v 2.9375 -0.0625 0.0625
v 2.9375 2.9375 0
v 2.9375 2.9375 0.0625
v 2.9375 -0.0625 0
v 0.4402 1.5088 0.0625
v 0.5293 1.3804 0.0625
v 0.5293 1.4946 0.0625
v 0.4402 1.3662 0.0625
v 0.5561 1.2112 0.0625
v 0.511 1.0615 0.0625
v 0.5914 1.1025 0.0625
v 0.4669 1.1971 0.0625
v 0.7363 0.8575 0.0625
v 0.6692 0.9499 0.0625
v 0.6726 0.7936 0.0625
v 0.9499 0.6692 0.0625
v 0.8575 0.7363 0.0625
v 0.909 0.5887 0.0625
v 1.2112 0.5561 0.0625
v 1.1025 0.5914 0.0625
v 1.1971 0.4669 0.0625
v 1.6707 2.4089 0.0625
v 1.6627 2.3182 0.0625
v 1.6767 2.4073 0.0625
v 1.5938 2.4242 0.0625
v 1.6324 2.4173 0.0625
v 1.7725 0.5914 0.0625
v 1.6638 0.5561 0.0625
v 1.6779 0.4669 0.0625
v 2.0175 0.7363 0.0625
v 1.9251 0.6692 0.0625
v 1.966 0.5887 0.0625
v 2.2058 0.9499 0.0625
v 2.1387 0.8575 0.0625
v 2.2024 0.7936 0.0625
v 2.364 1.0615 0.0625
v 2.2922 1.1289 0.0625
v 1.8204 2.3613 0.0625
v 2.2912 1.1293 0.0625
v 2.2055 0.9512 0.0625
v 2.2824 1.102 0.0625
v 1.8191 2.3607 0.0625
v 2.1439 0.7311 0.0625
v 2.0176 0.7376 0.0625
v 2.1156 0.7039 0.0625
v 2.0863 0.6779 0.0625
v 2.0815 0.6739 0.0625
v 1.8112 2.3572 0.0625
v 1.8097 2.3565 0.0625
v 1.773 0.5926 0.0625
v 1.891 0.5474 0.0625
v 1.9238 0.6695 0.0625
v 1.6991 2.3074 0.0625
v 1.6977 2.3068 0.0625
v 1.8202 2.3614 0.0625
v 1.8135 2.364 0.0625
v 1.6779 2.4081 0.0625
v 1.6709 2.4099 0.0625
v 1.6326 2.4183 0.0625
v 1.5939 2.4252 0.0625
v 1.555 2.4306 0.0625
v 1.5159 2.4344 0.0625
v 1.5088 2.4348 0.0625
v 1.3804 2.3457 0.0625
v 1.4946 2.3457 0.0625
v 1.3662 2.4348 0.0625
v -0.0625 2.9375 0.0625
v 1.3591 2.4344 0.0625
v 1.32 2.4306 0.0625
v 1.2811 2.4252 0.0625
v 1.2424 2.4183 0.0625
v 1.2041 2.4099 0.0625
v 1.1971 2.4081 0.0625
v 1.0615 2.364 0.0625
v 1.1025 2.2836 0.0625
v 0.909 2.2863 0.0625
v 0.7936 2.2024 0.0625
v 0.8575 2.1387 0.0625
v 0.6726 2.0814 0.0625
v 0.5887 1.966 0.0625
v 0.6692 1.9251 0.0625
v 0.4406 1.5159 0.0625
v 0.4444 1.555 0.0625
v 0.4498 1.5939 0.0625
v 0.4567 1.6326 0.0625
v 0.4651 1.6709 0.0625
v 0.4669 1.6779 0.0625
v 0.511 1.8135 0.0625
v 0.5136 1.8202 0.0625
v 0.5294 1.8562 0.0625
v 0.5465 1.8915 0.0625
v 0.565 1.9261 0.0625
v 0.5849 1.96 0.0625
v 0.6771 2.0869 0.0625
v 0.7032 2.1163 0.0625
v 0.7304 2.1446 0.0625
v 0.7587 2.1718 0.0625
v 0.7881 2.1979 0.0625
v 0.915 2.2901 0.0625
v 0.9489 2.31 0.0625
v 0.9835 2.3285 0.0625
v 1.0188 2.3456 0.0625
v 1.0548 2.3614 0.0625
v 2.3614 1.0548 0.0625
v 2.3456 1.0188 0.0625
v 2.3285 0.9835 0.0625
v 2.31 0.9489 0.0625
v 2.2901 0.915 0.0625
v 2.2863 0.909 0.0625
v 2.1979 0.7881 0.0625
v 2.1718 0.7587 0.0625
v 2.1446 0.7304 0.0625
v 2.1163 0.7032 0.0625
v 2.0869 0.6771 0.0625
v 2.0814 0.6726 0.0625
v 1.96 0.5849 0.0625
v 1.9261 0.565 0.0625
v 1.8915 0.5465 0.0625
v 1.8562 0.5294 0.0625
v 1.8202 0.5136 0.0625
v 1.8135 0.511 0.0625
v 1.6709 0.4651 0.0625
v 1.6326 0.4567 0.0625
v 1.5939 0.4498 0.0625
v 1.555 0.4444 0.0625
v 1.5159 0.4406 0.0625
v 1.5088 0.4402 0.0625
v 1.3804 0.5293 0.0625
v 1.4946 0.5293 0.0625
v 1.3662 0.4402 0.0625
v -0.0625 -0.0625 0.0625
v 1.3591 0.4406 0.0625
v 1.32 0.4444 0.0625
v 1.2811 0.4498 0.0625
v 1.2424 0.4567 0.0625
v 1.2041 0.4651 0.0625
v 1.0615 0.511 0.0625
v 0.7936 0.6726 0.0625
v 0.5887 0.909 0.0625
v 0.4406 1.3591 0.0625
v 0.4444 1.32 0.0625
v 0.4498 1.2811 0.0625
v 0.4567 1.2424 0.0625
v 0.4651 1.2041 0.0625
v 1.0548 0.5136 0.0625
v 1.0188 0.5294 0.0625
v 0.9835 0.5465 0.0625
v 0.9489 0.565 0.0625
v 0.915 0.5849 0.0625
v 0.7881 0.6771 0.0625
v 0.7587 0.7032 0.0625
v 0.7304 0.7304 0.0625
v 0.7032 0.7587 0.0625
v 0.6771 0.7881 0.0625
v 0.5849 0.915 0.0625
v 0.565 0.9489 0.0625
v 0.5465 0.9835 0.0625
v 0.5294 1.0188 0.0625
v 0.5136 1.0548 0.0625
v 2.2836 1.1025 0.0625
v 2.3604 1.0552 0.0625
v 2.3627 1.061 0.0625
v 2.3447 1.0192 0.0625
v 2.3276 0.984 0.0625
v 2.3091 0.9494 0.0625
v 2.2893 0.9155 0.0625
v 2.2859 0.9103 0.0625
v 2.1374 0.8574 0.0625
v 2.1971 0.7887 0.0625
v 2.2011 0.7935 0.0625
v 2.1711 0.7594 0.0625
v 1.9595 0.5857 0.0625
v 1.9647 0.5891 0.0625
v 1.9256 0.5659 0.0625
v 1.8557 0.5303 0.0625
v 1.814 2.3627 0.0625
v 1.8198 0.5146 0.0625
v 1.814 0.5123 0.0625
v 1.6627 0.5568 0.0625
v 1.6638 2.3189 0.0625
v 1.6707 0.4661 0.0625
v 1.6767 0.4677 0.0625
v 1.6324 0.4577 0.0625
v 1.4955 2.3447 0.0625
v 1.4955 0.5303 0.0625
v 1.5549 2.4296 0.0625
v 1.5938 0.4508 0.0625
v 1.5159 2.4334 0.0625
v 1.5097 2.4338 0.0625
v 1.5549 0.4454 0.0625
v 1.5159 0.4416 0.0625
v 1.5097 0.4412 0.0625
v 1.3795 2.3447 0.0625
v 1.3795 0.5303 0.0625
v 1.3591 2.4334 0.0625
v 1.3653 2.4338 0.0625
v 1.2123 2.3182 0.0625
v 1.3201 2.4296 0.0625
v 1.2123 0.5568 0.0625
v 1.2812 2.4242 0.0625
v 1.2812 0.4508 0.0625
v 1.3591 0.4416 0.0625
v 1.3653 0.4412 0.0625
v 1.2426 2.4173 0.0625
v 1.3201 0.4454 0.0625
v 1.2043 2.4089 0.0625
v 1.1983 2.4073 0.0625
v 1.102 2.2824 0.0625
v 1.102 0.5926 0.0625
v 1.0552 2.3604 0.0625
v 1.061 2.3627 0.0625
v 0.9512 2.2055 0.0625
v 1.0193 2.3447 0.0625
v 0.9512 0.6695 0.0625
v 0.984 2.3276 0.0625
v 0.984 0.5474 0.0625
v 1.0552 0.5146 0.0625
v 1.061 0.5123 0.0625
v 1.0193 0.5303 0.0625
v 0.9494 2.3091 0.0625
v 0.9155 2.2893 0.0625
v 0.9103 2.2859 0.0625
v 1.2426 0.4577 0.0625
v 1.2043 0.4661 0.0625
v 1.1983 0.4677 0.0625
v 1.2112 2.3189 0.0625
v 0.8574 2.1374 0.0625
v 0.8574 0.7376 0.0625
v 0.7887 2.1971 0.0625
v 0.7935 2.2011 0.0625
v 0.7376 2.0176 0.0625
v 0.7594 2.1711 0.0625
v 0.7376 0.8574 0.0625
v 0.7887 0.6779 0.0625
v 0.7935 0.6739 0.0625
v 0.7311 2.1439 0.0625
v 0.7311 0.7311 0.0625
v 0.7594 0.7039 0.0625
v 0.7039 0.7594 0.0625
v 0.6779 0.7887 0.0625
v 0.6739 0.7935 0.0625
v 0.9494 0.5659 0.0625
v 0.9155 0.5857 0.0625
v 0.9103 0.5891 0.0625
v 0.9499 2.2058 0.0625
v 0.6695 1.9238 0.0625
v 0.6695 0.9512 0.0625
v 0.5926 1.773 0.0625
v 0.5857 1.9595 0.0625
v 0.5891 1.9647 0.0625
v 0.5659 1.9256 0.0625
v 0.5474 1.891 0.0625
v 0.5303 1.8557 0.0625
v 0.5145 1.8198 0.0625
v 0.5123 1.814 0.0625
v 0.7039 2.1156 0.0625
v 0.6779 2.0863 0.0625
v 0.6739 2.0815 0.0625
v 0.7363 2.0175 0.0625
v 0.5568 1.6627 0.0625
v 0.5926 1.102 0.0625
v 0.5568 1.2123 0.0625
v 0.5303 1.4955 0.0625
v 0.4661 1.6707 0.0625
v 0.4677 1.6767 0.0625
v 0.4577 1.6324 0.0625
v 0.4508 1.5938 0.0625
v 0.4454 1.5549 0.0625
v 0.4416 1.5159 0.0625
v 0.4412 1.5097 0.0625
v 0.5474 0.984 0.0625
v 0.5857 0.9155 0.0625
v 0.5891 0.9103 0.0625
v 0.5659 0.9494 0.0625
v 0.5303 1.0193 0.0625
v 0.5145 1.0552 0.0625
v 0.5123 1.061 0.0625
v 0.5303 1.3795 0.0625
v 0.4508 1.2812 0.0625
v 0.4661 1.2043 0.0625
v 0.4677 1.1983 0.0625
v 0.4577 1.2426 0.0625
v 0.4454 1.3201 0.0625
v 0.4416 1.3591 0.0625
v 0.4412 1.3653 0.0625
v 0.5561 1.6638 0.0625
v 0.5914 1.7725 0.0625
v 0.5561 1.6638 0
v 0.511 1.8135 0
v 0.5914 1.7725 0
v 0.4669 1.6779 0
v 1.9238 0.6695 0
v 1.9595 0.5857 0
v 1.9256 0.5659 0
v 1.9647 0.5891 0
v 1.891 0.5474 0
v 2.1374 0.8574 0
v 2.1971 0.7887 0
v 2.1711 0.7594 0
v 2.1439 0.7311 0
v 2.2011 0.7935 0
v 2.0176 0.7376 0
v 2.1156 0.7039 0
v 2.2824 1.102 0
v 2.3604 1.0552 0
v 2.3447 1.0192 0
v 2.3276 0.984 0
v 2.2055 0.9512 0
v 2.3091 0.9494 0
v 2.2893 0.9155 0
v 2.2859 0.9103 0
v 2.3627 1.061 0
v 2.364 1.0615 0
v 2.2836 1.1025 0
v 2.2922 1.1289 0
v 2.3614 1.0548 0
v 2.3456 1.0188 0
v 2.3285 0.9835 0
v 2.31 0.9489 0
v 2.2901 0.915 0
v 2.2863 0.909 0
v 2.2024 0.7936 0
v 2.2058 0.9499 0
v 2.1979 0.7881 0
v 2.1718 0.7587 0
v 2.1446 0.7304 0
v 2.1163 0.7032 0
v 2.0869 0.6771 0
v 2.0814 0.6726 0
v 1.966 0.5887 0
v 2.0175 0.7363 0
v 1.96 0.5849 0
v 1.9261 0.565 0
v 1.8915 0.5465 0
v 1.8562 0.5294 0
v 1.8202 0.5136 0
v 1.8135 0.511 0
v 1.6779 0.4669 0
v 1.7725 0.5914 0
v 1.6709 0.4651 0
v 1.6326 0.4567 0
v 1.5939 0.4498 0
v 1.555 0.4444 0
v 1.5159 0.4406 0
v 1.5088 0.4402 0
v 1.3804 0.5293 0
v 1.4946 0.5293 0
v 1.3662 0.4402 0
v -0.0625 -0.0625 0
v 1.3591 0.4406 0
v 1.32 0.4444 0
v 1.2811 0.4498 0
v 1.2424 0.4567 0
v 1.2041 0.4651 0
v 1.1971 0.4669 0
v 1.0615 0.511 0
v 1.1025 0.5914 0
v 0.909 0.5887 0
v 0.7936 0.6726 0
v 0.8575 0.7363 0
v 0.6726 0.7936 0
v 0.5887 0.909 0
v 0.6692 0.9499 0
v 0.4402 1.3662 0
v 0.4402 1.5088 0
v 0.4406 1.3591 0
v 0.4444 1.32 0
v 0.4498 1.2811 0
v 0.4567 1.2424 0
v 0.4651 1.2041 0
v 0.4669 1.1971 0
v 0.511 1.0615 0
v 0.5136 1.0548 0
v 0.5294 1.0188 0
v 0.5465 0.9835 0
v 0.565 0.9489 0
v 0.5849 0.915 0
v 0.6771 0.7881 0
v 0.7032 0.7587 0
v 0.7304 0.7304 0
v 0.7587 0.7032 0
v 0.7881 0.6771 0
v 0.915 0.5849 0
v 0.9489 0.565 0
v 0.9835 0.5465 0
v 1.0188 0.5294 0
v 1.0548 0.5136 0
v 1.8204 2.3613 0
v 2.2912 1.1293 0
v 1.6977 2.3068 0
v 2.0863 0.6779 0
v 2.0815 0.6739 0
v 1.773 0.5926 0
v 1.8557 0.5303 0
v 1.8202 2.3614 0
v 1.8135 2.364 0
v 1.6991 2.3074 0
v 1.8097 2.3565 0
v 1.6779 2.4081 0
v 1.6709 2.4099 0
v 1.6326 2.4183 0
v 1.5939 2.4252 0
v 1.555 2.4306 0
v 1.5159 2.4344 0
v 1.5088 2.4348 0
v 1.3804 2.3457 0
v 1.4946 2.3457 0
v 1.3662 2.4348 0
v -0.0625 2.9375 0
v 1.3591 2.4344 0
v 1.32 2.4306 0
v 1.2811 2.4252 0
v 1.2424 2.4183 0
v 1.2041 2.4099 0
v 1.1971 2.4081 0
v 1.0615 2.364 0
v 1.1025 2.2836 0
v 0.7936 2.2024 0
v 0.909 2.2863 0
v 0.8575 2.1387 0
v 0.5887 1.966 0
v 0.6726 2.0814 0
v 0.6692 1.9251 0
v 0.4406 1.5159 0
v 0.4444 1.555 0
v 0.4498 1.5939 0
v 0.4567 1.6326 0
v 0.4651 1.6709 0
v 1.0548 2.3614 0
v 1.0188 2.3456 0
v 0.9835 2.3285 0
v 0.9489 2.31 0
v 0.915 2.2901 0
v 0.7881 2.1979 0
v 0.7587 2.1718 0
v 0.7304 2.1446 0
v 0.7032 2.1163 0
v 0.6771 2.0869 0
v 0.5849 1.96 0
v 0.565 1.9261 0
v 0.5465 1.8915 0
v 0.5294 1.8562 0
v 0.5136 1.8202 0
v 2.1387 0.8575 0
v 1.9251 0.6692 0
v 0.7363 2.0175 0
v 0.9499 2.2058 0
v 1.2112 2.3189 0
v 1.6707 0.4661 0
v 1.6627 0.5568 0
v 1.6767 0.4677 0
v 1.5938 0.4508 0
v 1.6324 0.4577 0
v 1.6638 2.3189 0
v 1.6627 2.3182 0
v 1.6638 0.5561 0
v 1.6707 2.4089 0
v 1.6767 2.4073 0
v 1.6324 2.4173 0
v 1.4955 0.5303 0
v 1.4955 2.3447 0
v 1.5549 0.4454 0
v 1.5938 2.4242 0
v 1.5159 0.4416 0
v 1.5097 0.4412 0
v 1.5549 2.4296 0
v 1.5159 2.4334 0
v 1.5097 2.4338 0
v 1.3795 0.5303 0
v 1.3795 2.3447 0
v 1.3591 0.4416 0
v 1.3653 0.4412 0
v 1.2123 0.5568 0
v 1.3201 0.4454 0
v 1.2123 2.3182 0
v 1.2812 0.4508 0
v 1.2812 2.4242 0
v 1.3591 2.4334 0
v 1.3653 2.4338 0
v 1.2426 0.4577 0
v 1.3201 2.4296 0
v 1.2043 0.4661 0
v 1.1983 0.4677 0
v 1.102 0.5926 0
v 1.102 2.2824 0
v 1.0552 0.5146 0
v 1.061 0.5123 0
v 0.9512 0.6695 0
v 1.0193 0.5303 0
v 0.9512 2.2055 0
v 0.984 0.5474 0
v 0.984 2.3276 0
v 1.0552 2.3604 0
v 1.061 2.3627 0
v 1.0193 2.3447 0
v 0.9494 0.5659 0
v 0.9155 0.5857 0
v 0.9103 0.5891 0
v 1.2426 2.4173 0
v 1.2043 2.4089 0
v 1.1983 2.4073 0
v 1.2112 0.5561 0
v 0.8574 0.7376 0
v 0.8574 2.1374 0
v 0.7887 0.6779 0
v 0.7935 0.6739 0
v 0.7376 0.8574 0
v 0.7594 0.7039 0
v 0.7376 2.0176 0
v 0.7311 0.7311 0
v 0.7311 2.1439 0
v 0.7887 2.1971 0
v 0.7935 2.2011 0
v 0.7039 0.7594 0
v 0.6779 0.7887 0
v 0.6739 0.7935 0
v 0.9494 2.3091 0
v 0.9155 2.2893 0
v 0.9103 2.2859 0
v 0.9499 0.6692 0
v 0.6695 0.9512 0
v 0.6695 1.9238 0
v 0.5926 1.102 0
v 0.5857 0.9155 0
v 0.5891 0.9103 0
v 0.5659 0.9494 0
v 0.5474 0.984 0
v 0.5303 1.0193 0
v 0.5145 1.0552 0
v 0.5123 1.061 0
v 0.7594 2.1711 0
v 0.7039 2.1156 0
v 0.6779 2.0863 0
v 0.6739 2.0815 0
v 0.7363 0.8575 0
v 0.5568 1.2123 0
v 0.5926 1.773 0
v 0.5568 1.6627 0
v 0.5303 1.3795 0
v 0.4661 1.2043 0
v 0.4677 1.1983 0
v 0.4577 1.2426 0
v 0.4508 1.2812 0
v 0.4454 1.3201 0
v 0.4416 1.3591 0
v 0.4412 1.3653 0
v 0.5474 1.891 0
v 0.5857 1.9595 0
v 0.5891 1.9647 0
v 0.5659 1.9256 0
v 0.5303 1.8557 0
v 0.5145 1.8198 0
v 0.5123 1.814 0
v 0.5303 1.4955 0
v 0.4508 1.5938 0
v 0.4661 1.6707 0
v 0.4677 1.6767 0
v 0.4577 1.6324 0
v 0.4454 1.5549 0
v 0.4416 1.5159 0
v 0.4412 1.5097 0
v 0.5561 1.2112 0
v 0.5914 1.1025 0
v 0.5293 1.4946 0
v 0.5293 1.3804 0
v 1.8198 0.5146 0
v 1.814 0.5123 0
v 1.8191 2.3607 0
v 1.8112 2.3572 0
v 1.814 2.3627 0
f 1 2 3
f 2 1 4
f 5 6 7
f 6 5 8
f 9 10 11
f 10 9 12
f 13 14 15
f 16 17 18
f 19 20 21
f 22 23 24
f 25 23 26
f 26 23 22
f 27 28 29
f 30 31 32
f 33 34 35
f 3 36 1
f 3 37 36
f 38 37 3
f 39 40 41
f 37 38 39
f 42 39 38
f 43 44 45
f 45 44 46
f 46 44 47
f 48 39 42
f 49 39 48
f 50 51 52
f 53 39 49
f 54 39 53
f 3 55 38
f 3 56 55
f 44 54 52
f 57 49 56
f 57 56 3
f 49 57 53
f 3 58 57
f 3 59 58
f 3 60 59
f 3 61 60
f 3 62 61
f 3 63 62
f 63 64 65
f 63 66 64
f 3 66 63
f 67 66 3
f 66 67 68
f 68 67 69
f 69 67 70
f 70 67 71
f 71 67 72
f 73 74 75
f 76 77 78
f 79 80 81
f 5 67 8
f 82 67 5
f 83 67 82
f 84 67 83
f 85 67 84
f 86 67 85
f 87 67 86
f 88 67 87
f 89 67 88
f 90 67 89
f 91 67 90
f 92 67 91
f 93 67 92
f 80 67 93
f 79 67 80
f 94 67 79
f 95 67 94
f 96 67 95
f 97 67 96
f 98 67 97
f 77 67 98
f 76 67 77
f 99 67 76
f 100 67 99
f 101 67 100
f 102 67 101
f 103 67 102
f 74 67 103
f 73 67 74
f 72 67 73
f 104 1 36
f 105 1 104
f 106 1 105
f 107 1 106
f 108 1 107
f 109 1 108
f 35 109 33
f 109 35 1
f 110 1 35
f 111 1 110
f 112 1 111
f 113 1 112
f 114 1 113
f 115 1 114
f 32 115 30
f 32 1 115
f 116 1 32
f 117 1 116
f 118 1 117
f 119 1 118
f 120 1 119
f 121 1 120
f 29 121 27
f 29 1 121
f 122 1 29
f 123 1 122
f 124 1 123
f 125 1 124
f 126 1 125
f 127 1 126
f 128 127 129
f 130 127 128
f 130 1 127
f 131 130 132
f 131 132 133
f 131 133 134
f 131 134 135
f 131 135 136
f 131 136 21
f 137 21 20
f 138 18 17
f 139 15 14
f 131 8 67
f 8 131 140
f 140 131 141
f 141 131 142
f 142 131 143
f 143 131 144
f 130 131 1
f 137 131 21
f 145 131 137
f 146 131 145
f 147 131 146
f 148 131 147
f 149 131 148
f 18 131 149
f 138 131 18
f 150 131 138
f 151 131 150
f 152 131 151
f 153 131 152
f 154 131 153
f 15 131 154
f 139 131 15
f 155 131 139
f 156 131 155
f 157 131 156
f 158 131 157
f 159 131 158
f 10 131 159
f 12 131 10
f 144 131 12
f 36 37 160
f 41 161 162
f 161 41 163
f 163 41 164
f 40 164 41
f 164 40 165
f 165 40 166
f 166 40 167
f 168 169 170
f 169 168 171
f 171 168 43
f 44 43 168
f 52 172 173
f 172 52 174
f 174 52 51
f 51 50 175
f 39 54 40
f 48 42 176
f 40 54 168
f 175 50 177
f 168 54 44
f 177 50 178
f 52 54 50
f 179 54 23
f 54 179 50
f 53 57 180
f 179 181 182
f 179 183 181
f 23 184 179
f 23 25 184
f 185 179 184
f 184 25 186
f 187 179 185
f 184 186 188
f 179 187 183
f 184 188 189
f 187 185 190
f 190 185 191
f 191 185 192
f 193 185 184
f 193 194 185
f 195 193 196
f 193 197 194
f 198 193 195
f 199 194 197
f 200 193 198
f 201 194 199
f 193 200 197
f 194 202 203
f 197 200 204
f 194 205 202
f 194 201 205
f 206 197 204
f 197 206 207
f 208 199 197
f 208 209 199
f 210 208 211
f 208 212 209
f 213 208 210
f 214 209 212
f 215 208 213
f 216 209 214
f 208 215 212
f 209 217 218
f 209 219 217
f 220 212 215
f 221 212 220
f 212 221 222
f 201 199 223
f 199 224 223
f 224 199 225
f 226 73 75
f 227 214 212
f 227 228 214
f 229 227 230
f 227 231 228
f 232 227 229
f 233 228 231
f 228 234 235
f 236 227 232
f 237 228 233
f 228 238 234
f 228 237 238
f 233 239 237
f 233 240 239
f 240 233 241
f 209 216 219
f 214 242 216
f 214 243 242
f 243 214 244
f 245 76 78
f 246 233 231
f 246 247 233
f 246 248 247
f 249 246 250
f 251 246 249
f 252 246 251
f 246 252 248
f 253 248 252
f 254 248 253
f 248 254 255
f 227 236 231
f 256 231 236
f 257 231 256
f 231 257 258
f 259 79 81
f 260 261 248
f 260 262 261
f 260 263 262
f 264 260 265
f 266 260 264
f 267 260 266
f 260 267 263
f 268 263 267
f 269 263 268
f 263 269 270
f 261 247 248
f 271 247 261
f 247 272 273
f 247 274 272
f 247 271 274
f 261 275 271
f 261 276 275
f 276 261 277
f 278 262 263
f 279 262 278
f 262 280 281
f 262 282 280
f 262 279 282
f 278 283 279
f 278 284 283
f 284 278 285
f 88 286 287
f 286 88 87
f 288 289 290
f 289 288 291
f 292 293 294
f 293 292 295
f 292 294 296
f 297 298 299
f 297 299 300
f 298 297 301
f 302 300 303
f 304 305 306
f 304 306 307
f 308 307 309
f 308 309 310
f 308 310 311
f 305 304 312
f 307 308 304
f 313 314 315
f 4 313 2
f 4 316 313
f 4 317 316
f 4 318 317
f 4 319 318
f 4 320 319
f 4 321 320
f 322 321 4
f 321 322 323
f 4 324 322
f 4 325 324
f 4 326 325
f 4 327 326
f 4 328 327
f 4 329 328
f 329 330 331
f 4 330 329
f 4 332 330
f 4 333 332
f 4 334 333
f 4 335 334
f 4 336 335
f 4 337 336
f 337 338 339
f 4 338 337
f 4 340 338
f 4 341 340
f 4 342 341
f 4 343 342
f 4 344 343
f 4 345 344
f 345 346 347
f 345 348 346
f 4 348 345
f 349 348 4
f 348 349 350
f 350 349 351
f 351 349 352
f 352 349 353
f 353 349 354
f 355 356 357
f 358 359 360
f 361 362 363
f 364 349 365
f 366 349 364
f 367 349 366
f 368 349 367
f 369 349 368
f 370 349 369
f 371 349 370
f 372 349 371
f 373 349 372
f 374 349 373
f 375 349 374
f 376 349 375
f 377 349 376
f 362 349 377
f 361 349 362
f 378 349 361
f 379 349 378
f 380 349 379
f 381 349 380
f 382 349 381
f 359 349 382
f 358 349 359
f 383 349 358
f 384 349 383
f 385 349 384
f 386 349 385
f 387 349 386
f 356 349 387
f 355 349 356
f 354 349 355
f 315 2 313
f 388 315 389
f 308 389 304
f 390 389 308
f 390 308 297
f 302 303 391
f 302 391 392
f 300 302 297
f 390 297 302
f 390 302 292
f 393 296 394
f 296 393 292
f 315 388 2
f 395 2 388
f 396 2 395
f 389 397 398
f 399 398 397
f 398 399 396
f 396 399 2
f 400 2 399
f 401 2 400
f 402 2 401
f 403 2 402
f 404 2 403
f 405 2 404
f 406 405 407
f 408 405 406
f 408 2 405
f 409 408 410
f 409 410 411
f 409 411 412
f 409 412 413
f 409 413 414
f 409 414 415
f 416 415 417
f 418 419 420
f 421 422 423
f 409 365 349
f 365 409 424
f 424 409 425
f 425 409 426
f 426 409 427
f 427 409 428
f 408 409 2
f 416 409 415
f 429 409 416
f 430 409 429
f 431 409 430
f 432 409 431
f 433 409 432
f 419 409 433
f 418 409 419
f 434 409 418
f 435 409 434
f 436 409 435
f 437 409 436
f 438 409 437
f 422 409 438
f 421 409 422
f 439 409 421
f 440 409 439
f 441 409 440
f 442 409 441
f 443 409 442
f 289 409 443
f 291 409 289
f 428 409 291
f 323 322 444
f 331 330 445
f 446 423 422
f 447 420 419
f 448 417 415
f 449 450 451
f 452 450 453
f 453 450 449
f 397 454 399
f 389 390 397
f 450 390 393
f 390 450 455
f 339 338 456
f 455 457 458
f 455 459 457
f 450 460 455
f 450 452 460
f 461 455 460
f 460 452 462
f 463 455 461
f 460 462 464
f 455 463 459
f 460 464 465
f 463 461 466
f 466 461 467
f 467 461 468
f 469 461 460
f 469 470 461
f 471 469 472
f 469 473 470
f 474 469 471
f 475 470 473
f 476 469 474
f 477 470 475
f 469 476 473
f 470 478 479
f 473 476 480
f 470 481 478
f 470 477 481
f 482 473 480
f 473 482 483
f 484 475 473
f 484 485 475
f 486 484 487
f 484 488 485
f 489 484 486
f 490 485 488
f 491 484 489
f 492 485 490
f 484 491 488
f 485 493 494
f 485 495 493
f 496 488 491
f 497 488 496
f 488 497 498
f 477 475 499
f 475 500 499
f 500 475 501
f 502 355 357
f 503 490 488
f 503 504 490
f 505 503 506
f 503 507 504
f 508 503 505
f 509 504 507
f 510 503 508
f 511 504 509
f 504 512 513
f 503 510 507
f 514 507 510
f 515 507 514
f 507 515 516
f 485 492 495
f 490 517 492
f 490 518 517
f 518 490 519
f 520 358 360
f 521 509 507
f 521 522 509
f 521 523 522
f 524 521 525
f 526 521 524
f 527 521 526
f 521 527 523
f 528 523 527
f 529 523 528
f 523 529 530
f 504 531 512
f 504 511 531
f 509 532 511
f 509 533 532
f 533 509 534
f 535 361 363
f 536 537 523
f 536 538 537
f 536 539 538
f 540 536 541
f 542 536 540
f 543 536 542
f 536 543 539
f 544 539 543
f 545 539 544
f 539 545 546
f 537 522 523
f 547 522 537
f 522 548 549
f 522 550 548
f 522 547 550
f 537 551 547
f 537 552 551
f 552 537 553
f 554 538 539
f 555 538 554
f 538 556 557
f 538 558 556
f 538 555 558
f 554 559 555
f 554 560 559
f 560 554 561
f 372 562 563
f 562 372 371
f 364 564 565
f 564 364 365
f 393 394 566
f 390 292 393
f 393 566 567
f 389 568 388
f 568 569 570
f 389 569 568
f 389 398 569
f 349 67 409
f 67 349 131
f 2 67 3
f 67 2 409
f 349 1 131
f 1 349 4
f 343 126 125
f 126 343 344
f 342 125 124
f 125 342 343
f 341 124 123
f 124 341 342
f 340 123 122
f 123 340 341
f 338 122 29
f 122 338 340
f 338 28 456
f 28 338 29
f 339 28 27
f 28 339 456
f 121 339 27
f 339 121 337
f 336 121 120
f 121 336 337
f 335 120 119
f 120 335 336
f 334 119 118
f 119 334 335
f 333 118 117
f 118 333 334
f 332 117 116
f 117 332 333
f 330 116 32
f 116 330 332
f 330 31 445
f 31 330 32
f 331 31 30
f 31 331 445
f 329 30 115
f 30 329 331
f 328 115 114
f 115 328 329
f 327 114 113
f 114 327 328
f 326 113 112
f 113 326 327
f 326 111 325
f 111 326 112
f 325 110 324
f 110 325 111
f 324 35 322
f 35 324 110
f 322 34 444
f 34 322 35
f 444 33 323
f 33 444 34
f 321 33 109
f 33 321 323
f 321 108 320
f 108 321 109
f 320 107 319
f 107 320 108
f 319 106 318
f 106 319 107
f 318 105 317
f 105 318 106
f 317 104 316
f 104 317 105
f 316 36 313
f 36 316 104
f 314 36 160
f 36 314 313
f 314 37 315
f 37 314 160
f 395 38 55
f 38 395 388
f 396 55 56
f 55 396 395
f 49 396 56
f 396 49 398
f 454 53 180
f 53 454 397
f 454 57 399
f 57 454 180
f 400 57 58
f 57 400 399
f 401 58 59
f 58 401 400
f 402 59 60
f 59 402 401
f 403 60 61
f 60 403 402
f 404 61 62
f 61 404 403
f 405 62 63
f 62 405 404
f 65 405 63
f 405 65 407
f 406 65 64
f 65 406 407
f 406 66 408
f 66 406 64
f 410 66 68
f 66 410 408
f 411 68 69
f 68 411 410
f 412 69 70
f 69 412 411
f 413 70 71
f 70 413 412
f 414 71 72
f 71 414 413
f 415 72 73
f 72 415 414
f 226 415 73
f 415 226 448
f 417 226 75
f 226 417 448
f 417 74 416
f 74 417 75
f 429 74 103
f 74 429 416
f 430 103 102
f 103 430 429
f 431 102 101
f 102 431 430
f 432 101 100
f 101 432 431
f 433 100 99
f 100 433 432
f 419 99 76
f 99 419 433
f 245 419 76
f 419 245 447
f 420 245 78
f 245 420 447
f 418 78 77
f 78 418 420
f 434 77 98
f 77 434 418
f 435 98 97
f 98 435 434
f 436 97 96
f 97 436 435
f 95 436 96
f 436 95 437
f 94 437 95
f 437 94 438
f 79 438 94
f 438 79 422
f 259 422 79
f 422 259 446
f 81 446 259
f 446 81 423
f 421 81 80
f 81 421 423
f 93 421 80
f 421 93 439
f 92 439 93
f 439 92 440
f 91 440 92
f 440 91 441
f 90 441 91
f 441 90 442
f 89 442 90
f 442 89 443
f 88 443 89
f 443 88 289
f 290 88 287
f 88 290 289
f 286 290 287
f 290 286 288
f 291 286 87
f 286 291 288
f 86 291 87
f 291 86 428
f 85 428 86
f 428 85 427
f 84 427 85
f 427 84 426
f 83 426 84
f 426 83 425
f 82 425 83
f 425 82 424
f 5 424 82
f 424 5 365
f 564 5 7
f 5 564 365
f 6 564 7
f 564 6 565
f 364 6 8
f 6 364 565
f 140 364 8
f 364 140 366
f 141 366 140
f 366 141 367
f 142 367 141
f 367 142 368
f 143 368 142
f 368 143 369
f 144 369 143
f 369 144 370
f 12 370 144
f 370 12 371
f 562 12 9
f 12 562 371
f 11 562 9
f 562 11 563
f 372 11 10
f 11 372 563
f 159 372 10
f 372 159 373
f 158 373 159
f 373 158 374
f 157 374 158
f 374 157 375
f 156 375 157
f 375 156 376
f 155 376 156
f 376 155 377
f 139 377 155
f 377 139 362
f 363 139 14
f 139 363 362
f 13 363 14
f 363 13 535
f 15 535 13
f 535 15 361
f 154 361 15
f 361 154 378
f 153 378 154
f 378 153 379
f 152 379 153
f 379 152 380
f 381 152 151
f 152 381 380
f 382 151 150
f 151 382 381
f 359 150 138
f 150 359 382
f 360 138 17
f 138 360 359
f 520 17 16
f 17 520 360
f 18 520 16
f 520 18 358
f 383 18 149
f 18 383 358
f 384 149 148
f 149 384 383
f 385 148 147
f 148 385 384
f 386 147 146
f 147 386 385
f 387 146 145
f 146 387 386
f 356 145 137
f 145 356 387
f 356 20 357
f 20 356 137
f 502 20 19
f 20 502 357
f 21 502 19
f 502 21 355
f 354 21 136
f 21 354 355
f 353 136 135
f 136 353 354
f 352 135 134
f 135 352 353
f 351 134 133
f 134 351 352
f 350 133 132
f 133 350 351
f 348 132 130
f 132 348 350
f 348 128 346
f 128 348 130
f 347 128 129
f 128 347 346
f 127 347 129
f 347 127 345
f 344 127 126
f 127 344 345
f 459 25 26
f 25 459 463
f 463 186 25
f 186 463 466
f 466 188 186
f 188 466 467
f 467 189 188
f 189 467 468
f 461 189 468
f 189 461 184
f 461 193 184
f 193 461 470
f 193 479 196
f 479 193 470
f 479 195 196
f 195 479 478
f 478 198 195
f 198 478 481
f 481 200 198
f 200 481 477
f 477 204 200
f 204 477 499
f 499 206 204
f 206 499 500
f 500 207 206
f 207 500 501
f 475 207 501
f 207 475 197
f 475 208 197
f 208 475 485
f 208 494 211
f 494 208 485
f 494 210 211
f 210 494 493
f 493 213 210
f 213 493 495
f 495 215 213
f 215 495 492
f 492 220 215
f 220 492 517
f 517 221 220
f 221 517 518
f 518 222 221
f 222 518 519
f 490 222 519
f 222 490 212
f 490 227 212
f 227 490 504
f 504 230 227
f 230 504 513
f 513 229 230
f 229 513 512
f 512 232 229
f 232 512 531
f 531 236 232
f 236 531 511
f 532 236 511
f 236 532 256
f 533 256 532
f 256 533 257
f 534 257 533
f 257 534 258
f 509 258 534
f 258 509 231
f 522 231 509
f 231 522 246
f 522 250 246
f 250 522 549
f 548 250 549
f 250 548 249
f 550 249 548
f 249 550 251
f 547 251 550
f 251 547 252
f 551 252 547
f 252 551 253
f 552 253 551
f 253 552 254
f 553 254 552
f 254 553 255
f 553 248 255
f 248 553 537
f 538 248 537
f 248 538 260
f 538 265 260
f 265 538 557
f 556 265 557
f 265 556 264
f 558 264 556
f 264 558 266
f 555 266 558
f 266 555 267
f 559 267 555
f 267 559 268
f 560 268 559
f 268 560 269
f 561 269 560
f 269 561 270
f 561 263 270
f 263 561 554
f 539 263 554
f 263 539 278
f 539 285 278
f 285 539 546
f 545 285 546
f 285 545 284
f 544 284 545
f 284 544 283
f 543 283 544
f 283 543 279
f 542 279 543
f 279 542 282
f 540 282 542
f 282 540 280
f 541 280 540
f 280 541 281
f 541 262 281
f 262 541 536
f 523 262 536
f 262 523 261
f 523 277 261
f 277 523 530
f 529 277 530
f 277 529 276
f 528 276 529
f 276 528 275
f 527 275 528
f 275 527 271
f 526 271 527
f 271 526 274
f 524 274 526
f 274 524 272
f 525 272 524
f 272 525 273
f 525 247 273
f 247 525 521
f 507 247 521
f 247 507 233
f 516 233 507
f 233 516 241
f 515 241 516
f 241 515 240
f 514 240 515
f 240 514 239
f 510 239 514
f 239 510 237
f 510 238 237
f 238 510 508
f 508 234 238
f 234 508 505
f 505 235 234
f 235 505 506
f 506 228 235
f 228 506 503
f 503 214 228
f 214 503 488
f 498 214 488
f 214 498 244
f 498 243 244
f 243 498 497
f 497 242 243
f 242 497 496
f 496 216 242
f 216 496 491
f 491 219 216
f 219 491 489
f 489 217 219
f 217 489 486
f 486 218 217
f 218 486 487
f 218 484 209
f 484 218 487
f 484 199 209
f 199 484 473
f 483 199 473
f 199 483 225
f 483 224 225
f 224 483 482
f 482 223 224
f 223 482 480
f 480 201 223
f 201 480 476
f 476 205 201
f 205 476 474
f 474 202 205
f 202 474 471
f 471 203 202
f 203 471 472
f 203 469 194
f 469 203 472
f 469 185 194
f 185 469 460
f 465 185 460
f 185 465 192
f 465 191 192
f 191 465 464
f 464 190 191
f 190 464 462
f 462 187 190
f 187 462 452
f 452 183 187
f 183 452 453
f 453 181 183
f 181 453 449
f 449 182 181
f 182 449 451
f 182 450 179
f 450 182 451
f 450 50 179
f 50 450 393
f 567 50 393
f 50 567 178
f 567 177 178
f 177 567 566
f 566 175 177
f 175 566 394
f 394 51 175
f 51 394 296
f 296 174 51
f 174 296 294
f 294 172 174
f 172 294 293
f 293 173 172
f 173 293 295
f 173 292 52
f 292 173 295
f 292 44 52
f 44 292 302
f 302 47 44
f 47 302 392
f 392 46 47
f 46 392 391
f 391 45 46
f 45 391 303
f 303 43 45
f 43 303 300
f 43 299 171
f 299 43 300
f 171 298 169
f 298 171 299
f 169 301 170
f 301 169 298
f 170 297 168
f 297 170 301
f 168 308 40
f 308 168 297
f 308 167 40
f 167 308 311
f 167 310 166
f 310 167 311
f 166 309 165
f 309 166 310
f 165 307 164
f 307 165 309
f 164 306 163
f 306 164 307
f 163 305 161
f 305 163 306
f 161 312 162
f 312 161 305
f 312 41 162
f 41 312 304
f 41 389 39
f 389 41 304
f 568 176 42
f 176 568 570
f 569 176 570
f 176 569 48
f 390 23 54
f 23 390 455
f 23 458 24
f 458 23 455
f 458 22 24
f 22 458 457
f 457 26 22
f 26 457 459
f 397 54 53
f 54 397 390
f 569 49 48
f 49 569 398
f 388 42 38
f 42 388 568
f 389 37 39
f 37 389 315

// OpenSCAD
// file: sub_innergears.scad
// sub_innergears.scad — shared inner gear ring (ring with inward-pointing teeth)
// Requires caller to define: plate_w, plate_d, plate_h (see sub_base_plate.scad)
// Units: inches
//
// Usage — must be `include`, positioned after sub_base_plate.scad and before any
// code that references gear_r_tip/gear_r_root/gear_r_bore:
//   include <sub_base_plate.scad>
//   include <sub_innergears.scad>
//   gear("darkred");
//   gear_bore("lightgray");
//
// gear(c) and gear_bore(c) take a color string so tiles with different gear
// colors (e.g. darkred vs darkgreen) can share this same file.

gear_r_tip  = 1.18;   // outer edge of ring (plain)
gear_r_root = 1.00;   // ring inner edge; teeth root here
gear_r_bore = 0.82;   // bore radius / tooth tip depth
gear_n      = 20;
tooth_hw    = 4.5;
tooth_tip_f = 0.80;

// ── Gear 2D helpers ───────────────────────────────────────────────────────────

module gear_tooth_2d() {
    shift   = (gear_r_root - gear_r_bore) / 2;
    r_outer = gear_r_root + shift;
    r_inner = gear_r_bore + shift;
    polygon([
        [r_outer * cos(-tooth_hw),               r_outer * sin(-tooth_hw)],
        [r_inner * cos(-tooth_hw * tooth_tip_f),  r_inner * sin(-tooth_hw * tooth_tip_f)],
        [r_inner * cos( tooth_hw * tooth_tip_f),  r_inner * sin( tooth_hw * tooth_tip_f)],
        [r_outer * cos( tooth_hw),               r_outer * sin( tooth_hw)],
    ]);
}

module gear_2d() {
    circle(r = gear_r_tip, $fn = 160);
}

module bore_2d() {
    pitch = 360 / gear_n;
    difference() {
        circle(r = gear_r_root, $fn = 160);
        for (i = [0:gear_n - 1]) rotate([0, 0, i * pitch]) gear_tooth_2d();
    }
}

// ── Gear holes & gear ────────────────────────────────────────────────────────

module gear_holes() {
    translate([plate_w / 2, plate_d / 2, -1])
    linear_extrude(plate_h + 2)
    difference() {
        gear_2d();
        bore_2d();
    }
}

module gear(c) {
    color(c)
    translate([plate_w / 2, plate_d / 2, 0])
    linear_extrude(plate_h)
    difference() { gear_2d(); bore_2d(); }
}

// ── Gear bore hole & gear bore ────────────────────────────────────────────────

module gear_bore_holes() {
    translate([plate_w / 2, plate_d / 2, -1])
    linear_extrude(plate_h + 2)
    bore_2d();
}

module gear_bore(c) {
    color(c)
    translate([plate_w / 2, plate_d / 2, 0])
    linear_extrude(plate_h)
    offset(delta = -0.001) bore_2d();
}
// file: sub_base_plate.scad
// sub_base_plate.scad — shared tile-building blocks: plate, rivets, edge ID marks,
// and the common plate/hole dimensional constants used by every tile.
// Units: inches
//
// Usage — must be `include`, not `use`, and the include line must come
// before any code in the caller that references plate_w/plate_d/plate_h/
// frame_w/hole_d/hole_r: a variable defined only inside an included file is
// invisible to code positioned before the include statement.
//   include <sub_base_plate.scad>
//   plate(["red", undef, "blue", undef, undef, "green"]);
//
// plate(colors) is the main entry point: it builds the complete base tile in
// one call — the frame with edge ID marks, the darkgray plate, and the
// lightgray rivet ring (40 rivets, 10 per side, corners shared). colors is the
// same 6-slot frame_with_id() array described below.
//
// frame_with_id() colors are applied left-to-right (−x to +x), repeated
// identically on all four edges. Bottom and right edges read the array in
// reverse (slot 5-i) so the pattern stays consistent when the tile is flipped.
// Any position left as undef or omitted defaults to black. 6 regions span the
// straight run of each edge (corners always stay solid black). A thin black
// layer covers the marks on the top face; marks are visible from the edge.

plate_w = 2 + 7/8;
plate_d = 2 + 7/8;
plate_h = 1/16;
frame_w = 1/16;
hole_d  = 3/32;
hole_r  = hole_d / 2;

module rivet_holes() {
    spacing_x = plate_w / 10;
    spacing_y = plate_d / 10;
    inset_x   = spacing_x / 2;
    inset_y   = spacing_y / 2;
    for (i = [0:9]) translate([inset_x + i * spacing_x, inset_y,           -1]) cylinder(h = plate_h + 2, r = hole_r, $fn = 20);
    for (i = [0:9]) translate([inset_x + i * spacing_x, plate_d - inset_y, -1]) cylinder(h = plate_h + 2, r = hole_r, $fn = 20);
    for (i = [0:9]) translate([inset_x,           inset_y + i * spacing_y, -1]) cylinder(h = plate_h + 2, r = hole_r, $fn = 20);
    for (i = [0:9]) translate([plate_w - inset_x, inset_y + i * spacing_y, -1]) cylinder(h = plate_h + 2, r = hole_r, $fn = 20);
}

module rivets() {
    spacing_x = plate_w / 10;
    spacing_y = plate_d / 10;
    inset_x   = spacing_x / 2;
    inset_y   = spacing_y / 2;
    color("lightgray") {
        for (i = [0:9]) translate([inset_x + i * spacing_x, inset_y,           0]) cylinder(h = plate_h, r = hole_r, $fn = 20);
        for (i = [0:9]) translate([inset_x + i * spacing_x, plate_d - inset_y, 0]) cylinder(h = plate_h, r = hole_r, $fn = 20);
        for (i = [0:9]) translate([inset_x,           inset_y + i * spacing_y, 0]) cylinder(h = plate_h, r = hole_r, $fn = 20);
        for (i = [0:9]) translate([plate_w - inset_x, inset_y + i * spacing_y, 0]) cylinder(h = plate_h, r = hole_r, $fn = 20);
    }
}

module frame_with_id(colors = []) {
    id_cover = plate_h / 8;
    region_w = plate_w / 6;
    region_d = plate_d / 6;
    mark_h   = plate_h - id_cover;

    color("black")
    difference() {
        translate([-frame_w, -frame_w, 0])
            cube([plate_w + 2 * frame_w, plate_d + 2 * frame_w, plate_h]);
        translate([0, 0, -0.001])
            cube([plate_w, plate_d, plate_h + 0.002]);
        // top/bottom/left/right straight runs only — corners stay solid black
        translate([0, plate_d - 0.001, -0.001])
            cube([plate_w, frame_w + 0.002, plate_h + 0.002]);
        translate([0, -frame_w - 0.001, -0.001])
            cube([plate_w, frame_w + 0.002, plate_h + 0.002]);
        translate([-frame_w - 0.001, 0, -0.001])
            cube([frame_w + 0.002, plate_d, plate_h + 0.002]);
        translate([plate_w - 0.001, 0, -0.001])
            cube([frame_w + 0.002, plate_d, plate_h + 0.002]);
    }

    for (i = [0:5]) {
        c     = (colors[i] != undef) ? colors[i] : "black";

        // top edge
        color(c) translate([i * region_w, plate_d, 0]) cube([region_w, frame_w, mark_h]);
        color("black") translate([i * region_w, plate_d, mark_h]) cube([region_w, frame_w, id_cover]);

        // bottom edge (reversed)
        color(c) translate([(5-i) * region_w, -frame_w, 0]) cube([region_w, frame_w, mark_h]);
        color("black") translate([(5-i) * region_w, -frame_w, mark_h]) cube([region_w, frame_w, id_cover]);

        // left edge
        color(c) translate([-frame_w, i * region_d, 0]) cube([frame_w, region_d, mark_h]);
        color("black") translate([-frame_w, i * region_d, mark_h]) cube([frame_w, region_d, id_cover]);

        // right edge (reversed)
        color(c) translate([plate_w, (5-i) * region_d, 0]) cube([frame_w, region_d, mark_h]);
        color("black") translate([plate_w, (5-i) * region_d, mark_h]) cube([frame_w, region_d, id_cover]);
    }
}

module plate(colors = []) {
    frame_with_id(colors);
    union() {
        difference() {
            color("darkgray") cube([plate_w, plate_d, plate_h]);
            rivet_holes();
        }
        rivets();
    }
}
// file: sub_element100.scad
// sub_element100.scad — shared assembly for element100 flag tile variants
// Requires caller to define: plate_colors (6-slot frame color array),
// label_num (number painted on the flag)
// Units: inches

include <sub_base_plate.scad>
include <sub_innergears.scad>

// Pole — same inset_x gap from right rivet column as rivets are from edge
pole_r   = 0.04;
pole_cx  = plate_w - plate_w / 10;
pole_y1  = (plate_d / 20) + hole_r + 0.01;
pole_y2  = plate_d - (plate_d / 20) - hole_r - 0.01;

// Pennant — 2/3 pole height, top at pole top, tip extends well across gear
flag_base_x  = pole_cx;
flag_top_y   = pole_y2;
flag_bot_y   = pole_y2 - (pole_y2 - pole_y1) * 2 / 3;
flag_tip_x   = plate_w / 2 - gear_r_tip * 0.60;
flag_mid_y   = (flag_top_y + flag_bot_y) / 2;
outline_t    = 0.025;

// ── Flag 2D helpers ───────────────────────────────────────────────────────────

module flag_pennant_2d() {
    polygon([
        [flag_base_x, flag_top_y],
        [flag_base_x, flag_bot_y],
        [flag_tip_x,  flag_mid_y]
    ]);
}

module flag_label_2d(label) {
    translate([flag_base_x + (flag_tip_x - flag_base_x) * 0.38, flag_mid_y])
    text(label, size = 0.65, halign = "center", valign = "center",
         font = "Liberation Sans:style=Bold");
}

// ── Flag outline hole & flag outline ─────────────────────────────────────────

module flag_outline_holes() {
    translate([0, 0, -1])
    linear_extrude(plate_h + 2)
    difference() {
        offset(delta = outline_t) flag_pennant_2d();
        flag_pennant_2d();
    }
}

module flag_outline() {
    color("darkgray")
    linear_extrude(plate_h)
    difference() {
        offset(delta = outline_t) flag_pennant_2d();
        flag_pennant_2d();
    }
}

// ── Flag pole hole, flag hole → flag pole, flag ───────────────────────────────

module flag_pole_holes() {
    translate([pole_cx - pole_r, pole_y1, -1])
    cube([pole_r * 2, pole_y2 - pole_y1, plate_h + 2]);
}

module flag_pole() {
    color("red")
    translate([pole_cx - pole_r, pole_y1, 0])
    cube([pole_r * 2, pole_y2 - pole_y1, plate_h]);
}

module flag_holes() {
    translate([0, 0, -1])
    linear_extrude(plate_h + 2)
    flag_pennant_2d();
}

module flag() {
    color("red")
    linear_extrude(plate_h)
    flag_pennant_2d();
}

// ── Label hole → label ────────────────────────────────────────────────────────

module label_holes(label) {
    translate([0, 0, -1])
    linear_extrude(plate_h + 2)
    flag_label_2d(label);
}

module flag_label(label) {
    color("white")
    linear_extrude(plate_h)
    flag_label_2d(label);
}

// ── Assembly ──────────────────────────────────────────────────────────────────
// Each level: difference() cuts the holes INTO the running assembly,
//             union() then adds the feature that fills those holes.
// Innermost = first step; outermost = last step.

union() {                                           // step 5: add label
    difference() {
        union() {                                   // step 4: add flag pole & flag
            difference() {
                union() {                           // step 3: add flag outline
                    difference() {
                        union() {                   // step 2: add gear bore
                            difference() {
                                union() {           // step 1: add gear
                                    difference() {
                                        plate(plate_colors);   // step 0: plate (frame + rivets)
                                        gear_holes();       // cut gear holes
                                    }
                                    gear("darkred");        // fill with gear
                                }
                                gear_bore_holes();          // cut gear bore hole
                            }
                            gear_bore("lightgray");         // fill with gear bore
                        }
                        flag_outline_holes();               // cut flag outline hole
                    }
                    flag_outline();                         // fill with flag outline
                }
                flag_pole_holes();                          // cut flag pole hole
                flag_holes();                               // cut flag hole
            }
            flag_pole();                                    // fill with flag pole
            flag();                                         // fill with flag
        }
        label_holes(label_num);                             // cut label hole
    }
    flag_label(label_num);                                  // fill with label
}
// main file
// element100-2.scad
// Flag square tile variant — gear with pennant flag, number "2" on flag.

plate_colors = ["red", undef, "red", "red", "red", "red"];
label_num    = "2";

include <sub_element100.scad>
